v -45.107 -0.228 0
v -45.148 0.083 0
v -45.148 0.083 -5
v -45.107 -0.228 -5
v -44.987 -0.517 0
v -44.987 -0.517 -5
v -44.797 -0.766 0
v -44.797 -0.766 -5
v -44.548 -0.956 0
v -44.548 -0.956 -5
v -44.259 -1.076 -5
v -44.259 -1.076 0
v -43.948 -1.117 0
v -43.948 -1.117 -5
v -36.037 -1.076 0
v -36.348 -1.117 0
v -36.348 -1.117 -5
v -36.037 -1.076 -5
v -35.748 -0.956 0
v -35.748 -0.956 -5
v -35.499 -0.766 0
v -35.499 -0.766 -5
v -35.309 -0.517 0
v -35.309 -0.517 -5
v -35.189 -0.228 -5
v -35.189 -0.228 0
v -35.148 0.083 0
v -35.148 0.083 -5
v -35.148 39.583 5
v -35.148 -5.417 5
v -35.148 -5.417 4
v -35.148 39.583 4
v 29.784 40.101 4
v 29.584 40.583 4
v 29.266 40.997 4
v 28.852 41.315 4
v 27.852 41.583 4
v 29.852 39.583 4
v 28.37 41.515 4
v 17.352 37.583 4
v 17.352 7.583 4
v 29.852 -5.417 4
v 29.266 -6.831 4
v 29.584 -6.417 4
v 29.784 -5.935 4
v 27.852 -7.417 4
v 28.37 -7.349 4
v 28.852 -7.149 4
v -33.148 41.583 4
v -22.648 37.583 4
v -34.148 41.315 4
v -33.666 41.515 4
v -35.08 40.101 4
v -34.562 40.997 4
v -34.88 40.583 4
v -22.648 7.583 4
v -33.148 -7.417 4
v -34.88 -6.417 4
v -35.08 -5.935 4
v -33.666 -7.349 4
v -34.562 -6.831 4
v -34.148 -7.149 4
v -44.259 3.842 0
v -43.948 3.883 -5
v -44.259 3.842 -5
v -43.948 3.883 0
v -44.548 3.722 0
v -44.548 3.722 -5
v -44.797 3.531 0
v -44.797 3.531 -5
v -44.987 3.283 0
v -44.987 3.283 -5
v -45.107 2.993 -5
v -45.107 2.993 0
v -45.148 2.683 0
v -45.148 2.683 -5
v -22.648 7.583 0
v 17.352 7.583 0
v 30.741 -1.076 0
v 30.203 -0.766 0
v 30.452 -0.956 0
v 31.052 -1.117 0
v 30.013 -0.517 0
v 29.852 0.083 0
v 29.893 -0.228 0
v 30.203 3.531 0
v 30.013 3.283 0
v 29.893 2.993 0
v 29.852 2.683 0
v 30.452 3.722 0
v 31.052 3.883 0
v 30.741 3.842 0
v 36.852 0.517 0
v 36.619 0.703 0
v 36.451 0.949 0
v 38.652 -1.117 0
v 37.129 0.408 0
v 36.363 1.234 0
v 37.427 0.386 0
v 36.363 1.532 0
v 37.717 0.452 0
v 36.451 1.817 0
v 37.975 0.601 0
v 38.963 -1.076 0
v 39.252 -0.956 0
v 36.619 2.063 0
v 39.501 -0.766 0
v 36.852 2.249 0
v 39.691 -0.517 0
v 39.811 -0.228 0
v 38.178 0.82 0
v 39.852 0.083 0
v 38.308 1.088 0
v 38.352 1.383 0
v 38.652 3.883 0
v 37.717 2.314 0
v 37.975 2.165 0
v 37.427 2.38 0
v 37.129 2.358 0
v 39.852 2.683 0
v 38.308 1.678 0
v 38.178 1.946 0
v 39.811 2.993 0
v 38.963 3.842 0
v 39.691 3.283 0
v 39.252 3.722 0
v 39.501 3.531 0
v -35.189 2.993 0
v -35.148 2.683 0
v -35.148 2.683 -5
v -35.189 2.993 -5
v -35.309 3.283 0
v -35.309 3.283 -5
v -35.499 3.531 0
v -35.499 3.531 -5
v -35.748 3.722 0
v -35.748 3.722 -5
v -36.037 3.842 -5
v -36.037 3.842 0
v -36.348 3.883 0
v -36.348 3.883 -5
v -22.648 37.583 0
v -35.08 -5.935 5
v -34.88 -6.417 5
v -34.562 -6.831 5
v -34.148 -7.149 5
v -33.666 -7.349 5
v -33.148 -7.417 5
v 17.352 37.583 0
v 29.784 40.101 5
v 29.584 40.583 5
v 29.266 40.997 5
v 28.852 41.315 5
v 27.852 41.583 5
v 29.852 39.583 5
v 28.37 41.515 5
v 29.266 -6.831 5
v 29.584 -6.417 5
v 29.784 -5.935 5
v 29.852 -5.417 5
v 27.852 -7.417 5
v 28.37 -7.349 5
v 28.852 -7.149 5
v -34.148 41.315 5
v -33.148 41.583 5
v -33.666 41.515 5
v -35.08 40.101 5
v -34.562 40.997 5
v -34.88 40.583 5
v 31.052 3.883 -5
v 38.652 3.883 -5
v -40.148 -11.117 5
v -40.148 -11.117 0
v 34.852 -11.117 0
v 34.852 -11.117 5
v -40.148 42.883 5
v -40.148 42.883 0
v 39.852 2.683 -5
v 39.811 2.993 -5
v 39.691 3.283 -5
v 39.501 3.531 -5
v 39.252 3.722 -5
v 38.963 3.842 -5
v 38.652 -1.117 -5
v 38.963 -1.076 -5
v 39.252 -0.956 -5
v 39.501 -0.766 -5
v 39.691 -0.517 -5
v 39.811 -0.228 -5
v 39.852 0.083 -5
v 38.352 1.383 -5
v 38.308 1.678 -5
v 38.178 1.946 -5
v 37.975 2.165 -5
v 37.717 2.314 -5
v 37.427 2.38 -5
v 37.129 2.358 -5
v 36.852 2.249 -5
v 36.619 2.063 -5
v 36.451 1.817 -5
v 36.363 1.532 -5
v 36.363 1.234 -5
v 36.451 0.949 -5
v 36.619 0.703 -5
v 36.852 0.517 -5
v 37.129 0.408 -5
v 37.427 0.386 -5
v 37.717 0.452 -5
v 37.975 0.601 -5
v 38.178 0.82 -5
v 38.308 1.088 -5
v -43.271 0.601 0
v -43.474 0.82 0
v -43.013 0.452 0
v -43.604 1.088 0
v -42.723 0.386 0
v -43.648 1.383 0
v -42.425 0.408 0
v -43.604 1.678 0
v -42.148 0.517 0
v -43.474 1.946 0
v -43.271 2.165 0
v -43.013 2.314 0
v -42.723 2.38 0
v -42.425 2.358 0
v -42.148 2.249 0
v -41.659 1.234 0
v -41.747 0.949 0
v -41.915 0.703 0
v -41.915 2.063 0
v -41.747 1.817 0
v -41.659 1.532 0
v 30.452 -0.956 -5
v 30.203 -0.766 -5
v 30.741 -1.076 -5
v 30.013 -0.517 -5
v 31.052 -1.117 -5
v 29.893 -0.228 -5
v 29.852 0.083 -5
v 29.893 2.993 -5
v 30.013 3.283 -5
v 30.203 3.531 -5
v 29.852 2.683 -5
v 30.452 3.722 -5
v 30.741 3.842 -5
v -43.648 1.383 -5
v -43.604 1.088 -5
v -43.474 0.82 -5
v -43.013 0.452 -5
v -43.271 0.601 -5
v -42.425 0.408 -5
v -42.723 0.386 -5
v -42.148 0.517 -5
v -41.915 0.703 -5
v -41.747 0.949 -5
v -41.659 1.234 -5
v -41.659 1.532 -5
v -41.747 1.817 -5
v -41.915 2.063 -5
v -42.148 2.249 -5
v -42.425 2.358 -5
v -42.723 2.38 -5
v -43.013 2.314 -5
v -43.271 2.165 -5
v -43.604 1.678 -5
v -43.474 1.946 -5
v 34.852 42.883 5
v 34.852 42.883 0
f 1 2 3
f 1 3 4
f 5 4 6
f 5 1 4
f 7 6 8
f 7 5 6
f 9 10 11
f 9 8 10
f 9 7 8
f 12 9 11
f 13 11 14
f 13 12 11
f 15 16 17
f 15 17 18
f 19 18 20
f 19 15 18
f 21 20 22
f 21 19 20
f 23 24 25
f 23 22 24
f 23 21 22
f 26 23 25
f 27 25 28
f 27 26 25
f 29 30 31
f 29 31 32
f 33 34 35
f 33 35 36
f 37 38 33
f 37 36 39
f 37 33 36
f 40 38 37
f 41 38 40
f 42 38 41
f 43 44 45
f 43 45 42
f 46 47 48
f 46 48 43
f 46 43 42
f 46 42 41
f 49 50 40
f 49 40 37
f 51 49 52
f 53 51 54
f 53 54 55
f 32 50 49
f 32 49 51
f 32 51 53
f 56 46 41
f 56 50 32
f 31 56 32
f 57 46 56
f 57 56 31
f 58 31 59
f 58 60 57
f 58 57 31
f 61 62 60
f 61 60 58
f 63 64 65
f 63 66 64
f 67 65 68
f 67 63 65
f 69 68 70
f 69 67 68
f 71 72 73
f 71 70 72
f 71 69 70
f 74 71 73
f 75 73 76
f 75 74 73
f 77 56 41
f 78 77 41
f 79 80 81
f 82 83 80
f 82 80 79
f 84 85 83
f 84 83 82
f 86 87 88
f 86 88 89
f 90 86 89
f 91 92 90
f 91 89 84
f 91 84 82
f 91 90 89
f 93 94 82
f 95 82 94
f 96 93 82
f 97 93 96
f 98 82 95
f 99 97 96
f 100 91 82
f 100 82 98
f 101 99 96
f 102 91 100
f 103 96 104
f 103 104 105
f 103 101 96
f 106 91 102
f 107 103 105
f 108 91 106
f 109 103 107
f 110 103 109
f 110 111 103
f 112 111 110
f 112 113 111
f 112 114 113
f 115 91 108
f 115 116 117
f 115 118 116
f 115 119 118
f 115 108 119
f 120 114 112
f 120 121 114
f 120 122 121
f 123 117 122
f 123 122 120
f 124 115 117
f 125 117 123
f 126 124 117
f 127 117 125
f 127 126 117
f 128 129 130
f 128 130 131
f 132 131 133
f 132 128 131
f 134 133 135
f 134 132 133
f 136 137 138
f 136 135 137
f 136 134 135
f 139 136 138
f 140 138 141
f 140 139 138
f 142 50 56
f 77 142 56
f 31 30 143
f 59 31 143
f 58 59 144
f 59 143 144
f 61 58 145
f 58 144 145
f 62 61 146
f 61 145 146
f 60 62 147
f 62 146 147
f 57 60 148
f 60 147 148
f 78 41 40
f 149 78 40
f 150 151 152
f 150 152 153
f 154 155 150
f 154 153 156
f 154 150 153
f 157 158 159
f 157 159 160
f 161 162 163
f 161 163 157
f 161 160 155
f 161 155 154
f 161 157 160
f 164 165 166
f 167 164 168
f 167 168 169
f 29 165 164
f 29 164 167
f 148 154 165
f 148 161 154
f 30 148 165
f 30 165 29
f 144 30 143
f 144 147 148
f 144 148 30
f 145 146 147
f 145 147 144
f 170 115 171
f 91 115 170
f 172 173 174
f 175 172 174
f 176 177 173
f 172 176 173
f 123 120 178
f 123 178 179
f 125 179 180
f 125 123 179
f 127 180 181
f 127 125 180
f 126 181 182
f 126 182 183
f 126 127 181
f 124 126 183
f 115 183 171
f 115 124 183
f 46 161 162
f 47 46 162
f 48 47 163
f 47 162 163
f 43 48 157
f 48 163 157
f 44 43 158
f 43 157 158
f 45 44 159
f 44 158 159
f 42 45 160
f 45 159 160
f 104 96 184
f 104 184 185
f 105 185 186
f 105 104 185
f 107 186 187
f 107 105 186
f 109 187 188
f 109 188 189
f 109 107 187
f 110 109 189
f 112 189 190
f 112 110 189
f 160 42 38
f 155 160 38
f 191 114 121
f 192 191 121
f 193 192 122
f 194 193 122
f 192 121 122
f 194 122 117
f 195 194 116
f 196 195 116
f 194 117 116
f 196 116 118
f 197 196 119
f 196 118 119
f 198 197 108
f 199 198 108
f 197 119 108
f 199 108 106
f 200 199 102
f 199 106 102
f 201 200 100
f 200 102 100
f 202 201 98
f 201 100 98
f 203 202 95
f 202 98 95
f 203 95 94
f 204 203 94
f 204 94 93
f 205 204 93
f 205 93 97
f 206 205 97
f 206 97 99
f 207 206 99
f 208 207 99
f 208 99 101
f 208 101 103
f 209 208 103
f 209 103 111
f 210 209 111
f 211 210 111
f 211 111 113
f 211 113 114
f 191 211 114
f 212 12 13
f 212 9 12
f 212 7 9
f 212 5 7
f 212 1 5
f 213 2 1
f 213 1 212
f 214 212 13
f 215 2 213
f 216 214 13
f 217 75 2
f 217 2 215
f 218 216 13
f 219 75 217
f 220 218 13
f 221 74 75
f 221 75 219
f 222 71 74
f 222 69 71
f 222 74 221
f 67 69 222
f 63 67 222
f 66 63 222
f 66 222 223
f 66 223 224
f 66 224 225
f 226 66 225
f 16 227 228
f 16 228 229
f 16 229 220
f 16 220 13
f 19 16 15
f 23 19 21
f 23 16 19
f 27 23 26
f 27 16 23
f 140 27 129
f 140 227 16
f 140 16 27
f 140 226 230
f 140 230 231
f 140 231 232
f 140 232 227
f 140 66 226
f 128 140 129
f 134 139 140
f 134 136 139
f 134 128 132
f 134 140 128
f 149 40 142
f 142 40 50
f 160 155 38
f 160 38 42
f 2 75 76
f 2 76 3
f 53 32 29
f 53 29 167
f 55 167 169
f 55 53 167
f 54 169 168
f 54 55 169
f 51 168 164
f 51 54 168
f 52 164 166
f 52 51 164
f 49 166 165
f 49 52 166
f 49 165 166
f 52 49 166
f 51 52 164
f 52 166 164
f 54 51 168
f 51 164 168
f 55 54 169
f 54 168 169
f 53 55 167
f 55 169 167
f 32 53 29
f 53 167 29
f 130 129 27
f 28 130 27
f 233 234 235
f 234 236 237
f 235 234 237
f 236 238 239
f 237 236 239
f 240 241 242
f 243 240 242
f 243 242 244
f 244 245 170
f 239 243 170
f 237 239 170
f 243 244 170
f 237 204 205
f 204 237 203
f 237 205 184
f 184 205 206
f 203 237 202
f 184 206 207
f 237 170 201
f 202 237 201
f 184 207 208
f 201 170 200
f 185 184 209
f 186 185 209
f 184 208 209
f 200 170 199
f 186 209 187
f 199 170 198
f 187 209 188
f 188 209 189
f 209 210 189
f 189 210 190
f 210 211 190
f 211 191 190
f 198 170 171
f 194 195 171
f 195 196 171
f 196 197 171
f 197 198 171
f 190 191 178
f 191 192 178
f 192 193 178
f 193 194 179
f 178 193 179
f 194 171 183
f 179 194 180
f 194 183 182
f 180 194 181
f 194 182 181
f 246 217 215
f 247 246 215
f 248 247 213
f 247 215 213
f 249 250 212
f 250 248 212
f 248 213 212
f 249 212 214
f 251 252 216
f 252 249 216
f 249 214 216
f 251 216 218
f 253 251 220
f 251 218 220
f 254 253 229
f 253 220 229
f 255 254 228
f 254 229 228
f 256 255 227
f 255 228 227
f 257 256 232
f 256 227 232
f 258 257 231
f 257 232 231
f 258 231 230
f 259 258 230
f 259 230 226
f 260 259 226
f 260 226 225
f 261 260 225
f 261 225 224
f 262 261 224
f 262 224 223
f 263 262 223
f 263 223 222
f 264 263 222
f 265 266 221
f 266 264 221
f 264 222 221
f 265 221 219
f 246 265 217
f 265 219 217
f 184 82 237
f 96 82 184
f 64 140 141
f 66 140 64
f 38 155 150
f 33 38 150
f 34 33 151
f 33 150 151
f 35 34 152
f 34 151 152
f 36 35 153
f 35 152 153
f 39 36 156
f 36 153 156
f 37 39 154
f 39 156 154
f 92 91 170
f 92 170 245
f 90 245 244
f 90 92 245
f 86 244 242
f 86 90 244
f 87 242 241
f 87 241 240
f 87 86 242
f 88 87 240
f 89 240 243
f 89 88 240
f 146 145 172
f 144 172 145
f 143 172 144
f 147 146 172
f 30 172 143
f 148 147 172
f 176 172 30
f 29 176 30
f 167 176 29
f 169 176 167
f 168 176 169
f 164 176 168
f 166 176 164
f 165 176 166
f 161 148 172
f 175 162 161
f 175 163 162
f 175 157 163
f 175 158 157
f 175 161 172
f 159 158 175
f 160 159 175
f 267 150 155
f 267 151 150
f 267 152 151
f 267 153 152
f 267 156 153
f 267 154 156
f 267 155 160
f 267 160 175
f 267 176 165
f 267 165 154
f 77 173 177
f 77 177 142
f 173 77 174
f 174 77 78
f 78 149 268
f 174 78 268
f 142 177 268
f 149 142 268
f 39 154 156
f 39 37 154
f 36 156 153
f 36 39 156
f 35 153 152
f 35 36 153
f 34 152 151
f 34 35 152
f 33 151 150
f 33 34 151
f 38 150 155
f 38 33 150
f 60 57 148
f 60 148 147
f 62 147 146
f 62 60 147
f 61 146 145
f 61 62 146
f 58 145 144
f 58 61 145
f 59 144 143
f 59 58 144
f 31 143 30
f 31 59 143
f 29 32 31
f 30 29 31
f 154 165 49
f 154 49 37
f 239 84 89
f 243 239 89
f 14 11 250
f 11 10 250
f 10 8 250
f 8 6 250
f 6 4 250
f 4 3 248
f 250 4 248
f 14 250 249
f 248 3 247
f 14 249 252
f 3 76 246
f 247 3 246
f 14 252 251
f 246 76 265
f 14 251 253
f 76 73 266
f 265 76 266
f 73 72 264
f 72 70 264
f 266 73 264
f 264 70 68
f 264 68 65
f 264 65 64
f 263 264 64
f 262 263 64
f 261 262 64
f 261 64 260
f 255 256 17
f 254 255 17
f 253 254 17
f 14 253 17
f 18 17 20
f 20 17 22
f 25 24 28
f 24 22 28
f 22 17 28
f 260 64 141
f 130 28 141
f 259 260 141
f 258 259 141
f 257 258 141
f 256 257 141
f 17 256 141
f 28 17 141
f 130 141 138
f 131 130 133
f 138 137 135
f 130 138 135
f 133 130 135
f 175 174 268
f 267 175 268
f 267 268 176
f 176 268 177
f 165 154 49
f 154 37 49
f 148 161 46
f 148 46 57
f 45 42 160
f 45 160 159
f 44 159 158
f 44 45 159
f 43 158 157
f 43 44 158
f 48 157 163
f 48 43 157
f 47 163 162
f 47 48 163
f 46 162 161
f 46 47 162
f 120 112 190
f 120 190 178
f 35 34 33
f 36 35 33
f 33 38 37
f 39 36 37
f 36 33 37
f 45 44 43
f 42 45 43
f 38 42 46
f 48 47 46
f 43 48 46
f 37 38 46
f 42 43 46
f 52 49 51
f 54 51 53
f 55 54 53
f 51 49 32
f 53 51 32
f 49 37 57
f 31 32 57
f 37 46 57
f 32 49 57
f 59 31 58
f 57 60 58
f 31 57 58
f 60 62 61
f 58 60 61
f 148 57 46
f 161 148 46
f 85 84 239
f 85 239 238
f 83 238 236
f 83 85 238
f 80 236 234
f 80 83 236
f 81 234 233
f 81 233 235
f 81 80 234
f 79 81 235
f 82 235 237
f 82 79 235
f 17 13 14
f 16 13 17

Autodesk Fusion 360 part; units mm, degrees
sketch "Sketch1" plane through (0, 0, 0) normal (0, 0, 1) x (1, 0, 0)
  line L0 (34.852, 42.8829) -> (-40.148, 42.8829)
  line L1 (-40.148, 42.8829) -> (-40.148, -11.1171)
  line L2 (-40.148, -11.1171) -> (34.852, -11.1171)
  line L3 (34.852, -11.1171) -> (34.852, 42.8829)
  line L4 (34.852, -11.1171) -> (34.852, -1.1171)
  line L5 (34.852, -1.1171) -> (38.652, -1.1171)
  line L6 (38.652, 3.8829) -> (34.852, 3.8829)
  line L7 (34.852, -1.1171) -> (38.652, -1.1171)
  line L8 (39.852, 0.0829) -> (39.852, 2.6829)
  line L9 (38.652, 3.8829) -> (34.852, 3.8829)
  line L10 (34.852, 3.8829) -> (34.852, -1.1171)
  circle A0 centre (37.352, 1.3829) radius 1
  arc A1 (38.652, -1.1171) -> (39.852, 0.0829) centre (38.652, 0.0829) ccw
  arc A2 (39.852, 2.6829) -> (38.652, 3.8829) centre (38.652, 2.6829) ccw
  line L11 (34.852, -1.1171) -> (31.052, -1.1171)
  line L12 (29.852, 0.0829) -> (29.852, 2.6829)
  line L13 (31.052, 3.8829) -> (34.852, 3.8829)
  line L14 (34.852, 3.8829) -> (34.852, -1.1171)
  arc A3 (29.852, 0.0829) -> (31.052, -1.1171) centre (31.052, 0.0829) ccw
  arc A4 (31.052, 3.8829) -> (29.852, 2.6829) centre (31.052, 2.6829) ccw
  line L15 (-2.648, 42.8829) -> (-2.648, -11.1171)
  line L16 (-2.648, 41.5829) -> (-33.148, 41.5829)
  line L17 (-2.648, 41.5829) -> (27.852, 41.5829)
  line L18 (29.852, 39.5829) -> (29.852, -5.4171)
  line L19 (27.852, -7.4171) -> (-31.9002, -7.4171)
  line L20 (-31.9002, -7.4171) -> (-33.148, -7.4171)
  line L21 (-35.148, -5.4171) -> (-35.148, 39.5829)
  arc A5 (27.852, -7.4171) -> (29.852, -5.4171) centre (27.852, -5.4171) ccw
  arc A6 (-35.148, -5.4171) -> (-33.148, -7.4171) centre (-33.148, -5.4171) ccw
  arc A7 (-33.148, 41.5829) -> (-35.148, 39.5829) centre (-33.148, 39.5829) ccw
  arc A8 (29.852, 39.5829) -> (27.852, 41.5829) centre (27.852, 39.5829) ccw
  point P0 (29.852, -1.1171)
  point P1 (-35.148, 41.5829)
  point P2 (29.852, 41.5829)
  point P3 (29.852, -7.4171)
  dimension "d1" = 75
  dimension "d2" = 54
  dimension "d5" = 10
  dimension "d8" = 5
  dimension "d9" = 2
  dimension "d10" = 1.2
  dimension "d11" = 5
  dimension "d12" = 1.2
  dimension "d13" = 5
  dimension "d14" = 5
  dimension "d15" = 1.2
  dimension "d18" = 32.5
  dimension "d19" = 49
  dimension "d20" = 1.3
  dimension "d21" = 2.5
  dimension "d22" = 2
extrude "Extrude2" add sketch "Sketch1" against normal blind 5 contours L3 L5 L6 L7 L8 L9 L10 A1 A2 L14 | L3 L10 L11 L12 L13 L14 A3 A4 L18 makes body 1
extrude "Extrude1" add sketch "Sketch1" along normal blind 5 separate body contours L0 L3 L13 A4 L15 L17 L18 A8 | L0 L1 L2 L15 L16 L19 L20 L21 A6 A7 | L3 L10 L11 L12 L13 L14 A3 A4 L18 | L12 L15 L17 L18 L19 A5 A8 | L15 L16 L19 L20 L21 A6 A7 | L2 L3 L4 L11 A3 L15 L18 L19 A5 makes body 2
sketch "Sketch2" plane through (0, 0, 5) normal (0, 0, 1) x (-1, 0, 0)
  line L0 (-34.852, 11.1171) -> (-34.852, -42.8829)
  line L1 (-34.852, -42.8829) -> (40.148, -42.8829)
  line L2 (40.148, -42.8829) -> (40.148, 11.1171)
  line L3 (40.148, 11.1171) -> (-34.852, 11.1171)
sketch "Sketch3" plane through (0, 0, 5) normal (0, 0, 1) x (-1, 0, 0)
  line L0 (-29.852, -39.5829) -> (-29.852, 5.4171)
  line L1 (-27.852, 7.4171) -> (31.9002, 7.4171)
  arc A0 (-27.852, 7.4171) -> (-29.852, 5.4171) centre (-27.852, 5.4171) ccw
  arc A1 (35.148, 5.4171) -> (33.148, 7.4171) centre (33.148, 5.4171) ccw
  line L2 (31.9002, 7.4171) -> (33.148, 7.4171)
  line L3 (35.148, 5.4171) -> (35.148, -39.5829)
  arc A2 (33.148, -41.5829) -> (35.148, -39.5829) centre (33.148, -39.5829) ccw
  line L4 (2.648, -41.5829) -> (33.148, -41.5829)
  line L5 (2.648, -41.5829) -> (-27.852, -41.5829)
  arc A3 (-29.852, -39.5829) -> (-27.852, -41.5829) centre (-27.852, -39.5829) ccw
extrude "Extrude3" cut sketch "Sketch3" against normal blind 1 bodies 2
sketch "Sketch4" plane through (0, 0, 5) normal (0, 0, 1) x (-1, 0, 0)
sketch "Sketch5" plane through (0, 0, 4) normal (0, 0, 1) x (-1, 0, 0)
  arc A0 (-27.852, 7.4171) -> (-29.852, 5.4171) centre (-27.852, 5.4171) ccw
  line L0 (-29.852, 5.4171) -> (-29.852, -39.5829)
  arc A1 (-29.852, -39.5829) -> (-27.852, -41.5829) centre (-27.852, -39.5829) ccw
  line L1 (-27.852, -41.5829) -> (33.148, -41.5829)
  arc A2 (33.148, -41.5829) -> (35.148, -39.5829) centre (33.148, -39.5829) ccw
  line L2 (35.148, -39.5829) -> (35.148, 5.4171)
  arc A3 (35.148, 5.4171) -> (33.148, 7.4171) centre (33.148, 5.4171) ccw
  line L3 (33.148, 7.4171) -> (-27.852, 7.4171)
  line L4 (2.648, 7.4171) -> (2.648, -39.5791)
  line L5 (2.648, -37.5829) -> (-17.352, -37.5829)
  line L6 (2.648, -37.5829) -> (22.648, -37.5829)
  line L7 (22.648, -37.5829) -> (22.648, -7.5829)
  line L8 (22.648, -7.5829) -> (-17.352, -7.5829)
  line L9 (-17.352, -7.5829) -> (-17.352, -37.5829)
  dimension "d27" = 20
  dimension "d28" = 4
  dimension "d29" = 20
  dimension "d30" = 30
extrude "Extrude4" cut sketch "Sketch5" against normal blind 60 contours L4 L6 L7 L8 | L4 L5 L8 L9 bodies 2
ref_plane "WorkPlane1" through (-2.648, 15.8829, 2.5) normal (-1, 0, 0) x (0, -1, 0)
mirror "Mirror1" about plane through (-2.648, 15.8829, 2.5) normal (-1, 0, 0) of bodies 1 makes body 3
copy_body "Body->Comp1" bodies 3 removing the originals makes body 4 in component "Component"
copy_body "Body->Comp2" bodies 1 removing the originals makes body 5 in component "Component'"
copy_body "Body->Comp3" bodies 2 removing the originals makes body 6 in component "MainBody"
sketch "Sketch6" plane through (0, 0, 5) normal (0, 0, 1) x (-1, 0, 0)
  line L0 (-29.852, -39.5829) -> (-29.852, 5.4171)
  arc A0 (-27.852, 7.4171) -> (-29.852, 5.4171) centre (-27.852, 5.4171) ccw
  line L1 (-27.852, 7.4171) -> (33.148, 7.4171)
  arc A1 (35.148, 5.4171) -> (33.148, 7.4171) centre (33.148, 5.4171) ccw
  line L2 (35.148, 5.4171) -> (35.148, -39.5829)
  arc A2 (33.148, -41.5829) -> (35.148, -39.5829) centre (33.148, -39.5829) ccw
  line L3 (33.148, -41.5829) -> (-27.852, -41.5829)
  arc A3 (-29.852, -39.5829) -> (-27.852, -41.5829) centre (-27.852, -39.5829) ccw
  line L4 (-34.852, 11.1171) -> (-34.852, -42.8829)
  line L5 (-34.852, -42.8829) -> (40.148, -42.8829)
  line L6 (40.148, -42.8829) -> (40.148, 11.1171)
  line L7 (40.148, 11.1171) -> (-34.852, 11.1171)
  line L8 (22.648, -7.5829) -> (22.648, -37.5829)
  line L9 (22.648, -37.5829) -> (-17.352, -37.5829)
  line L10 (-17.352, -37.5829) -> (-17.352, -7.5829)
  line L11 (-17.352, -7.5829) -> (22.648, -7.5829)
  arc A4 (-27.852, 7.4171) -> (-29.852, 5.4171) centre (-27.852, 5.4171) ccw
  line L12 (-29.852, 5.4171) -> (-29.852, -39.5829)
  arc A5 (-29.852, -39.5829) -> (-27.852, -41.5829) centre (-27.852, -39.5829) ccw
  line L13 (-27.852, -41.5829) -> (33.148, -41.5829)
  arc A6 (33.148, -41.5829) -> (35.148, -39.5829) centre (33.148, -39.5829) ccw
  line L14 (35.148, -39.5829) -> (35.148, 5.4171)
  arc A7 (35.148, 5.4171) -> (33.148, 7.4171) centre (33.148, 5.4171) ccw
  line L15 (33.148, 7.4171) -> (-27.852, 7.4171)
  line L16 (-34.852, -42.8829) -> (-34.852, 11.1171)
  line L17 (40.148, 11.1171) -> (-34.852, 11.1171)
  line L18 (40.148, 11.1171) -> (40.148, -42.8829)
  line L19 (-34.852, -42.8829) -> (40.148, -42.8829)
  line L20 (33.148, -41.5829) -> (-27.852, -41.5829)
  line L21 (-29.852, 5.4171) -> (-29.852, -39.5829)
  arc A8 (-29.852, -39.5829) -> (-27.852, -41.5829) centre (-27.852, -39.5829) ccw
  arc A9 (-27.852, 7.4171) -> (-29.852, 5.4171) centre (-27.852, 5.4171) ccw
  line L22 (-27.852, 7.4171) -> (33.148, 7.4171)
  arc A10 (35.148, 5.4171) -> (33.148, 7.4171) centre (33.148, 5.4171) ccw
sketch "Sketch7" plane through (0, 0, 4) normal (0, 0, 1) x (-1, 0, 0)
  line L0 (22.648, -7.5829) -> (22.648, -37.5829)
  line L1 (22.648, -37.5829) -> (-17.352, -37.5829)
  line L2 (-17.352, -37.5829) -> (-17.352, -7.5829)
  line L3 (-17.352, -7.5829) -> (22.648, -7.5829)
  arc A0 (-27.852, 7.4171) -> (-29.852, 5.4171) centre (-27.852, 5.4171) ccw
  line L4 (-29.852, 5.4171) -> (-29.852, -39.5829)
  arc A1 (-29.852, -39.5829) -> (-27.852, -41.5829) centre (-27.852, -39.5829) ccw
  line L5 (-27.852, -41.5829) -> (33.148, -41.5829)
  arc A2 (33.148, -41.5829) -> (35.148, -39.5829) centre (33.148, -39.5829) ccw
  line L6 (35.148, -39.5829) -> (35.148, 5.4171)
  arc A3 (35.148, 5.4171) -> (33.148, 7.4171) centre (33.148, 5.4171) ccw
  line L7 (33.148, 7.4171) -> (-27.852, 7.4171)
extrude "Extrude1'" add sketch "Sketch7" along normal blind 1 separate body contours L0 L1 L2 L3 | A0 L4 A1 L5 A2 L6 A3 L7 makes body 7 in component "Component''"
component "Feet" placed x (1, 0, 0) y (0, 1, 0) z (0, 0, 1) at (0, 0, 0)
component "MainBody" placed x (1, 0, 0) y (0, 1, 0) z (0, 0, 1) at (0, 0, 0)
component "Component''" placed x (1, 0, 0) y (0, 1, 0) z (0, 0, 1) at (0, 0, 0)
component "Component'" placed x (1, 0, 0) y (0, 1, 0) z (0, 0, 1) at (0, 0, 0) in component "Feet"
component "Component" placed x (1, 0, 0) y (0, 1, 0) z (0, 0, 1) at (0, 0, 0) in component "Feet"
equation "d18 = ( 65 / 2 ) * 1 mm"
